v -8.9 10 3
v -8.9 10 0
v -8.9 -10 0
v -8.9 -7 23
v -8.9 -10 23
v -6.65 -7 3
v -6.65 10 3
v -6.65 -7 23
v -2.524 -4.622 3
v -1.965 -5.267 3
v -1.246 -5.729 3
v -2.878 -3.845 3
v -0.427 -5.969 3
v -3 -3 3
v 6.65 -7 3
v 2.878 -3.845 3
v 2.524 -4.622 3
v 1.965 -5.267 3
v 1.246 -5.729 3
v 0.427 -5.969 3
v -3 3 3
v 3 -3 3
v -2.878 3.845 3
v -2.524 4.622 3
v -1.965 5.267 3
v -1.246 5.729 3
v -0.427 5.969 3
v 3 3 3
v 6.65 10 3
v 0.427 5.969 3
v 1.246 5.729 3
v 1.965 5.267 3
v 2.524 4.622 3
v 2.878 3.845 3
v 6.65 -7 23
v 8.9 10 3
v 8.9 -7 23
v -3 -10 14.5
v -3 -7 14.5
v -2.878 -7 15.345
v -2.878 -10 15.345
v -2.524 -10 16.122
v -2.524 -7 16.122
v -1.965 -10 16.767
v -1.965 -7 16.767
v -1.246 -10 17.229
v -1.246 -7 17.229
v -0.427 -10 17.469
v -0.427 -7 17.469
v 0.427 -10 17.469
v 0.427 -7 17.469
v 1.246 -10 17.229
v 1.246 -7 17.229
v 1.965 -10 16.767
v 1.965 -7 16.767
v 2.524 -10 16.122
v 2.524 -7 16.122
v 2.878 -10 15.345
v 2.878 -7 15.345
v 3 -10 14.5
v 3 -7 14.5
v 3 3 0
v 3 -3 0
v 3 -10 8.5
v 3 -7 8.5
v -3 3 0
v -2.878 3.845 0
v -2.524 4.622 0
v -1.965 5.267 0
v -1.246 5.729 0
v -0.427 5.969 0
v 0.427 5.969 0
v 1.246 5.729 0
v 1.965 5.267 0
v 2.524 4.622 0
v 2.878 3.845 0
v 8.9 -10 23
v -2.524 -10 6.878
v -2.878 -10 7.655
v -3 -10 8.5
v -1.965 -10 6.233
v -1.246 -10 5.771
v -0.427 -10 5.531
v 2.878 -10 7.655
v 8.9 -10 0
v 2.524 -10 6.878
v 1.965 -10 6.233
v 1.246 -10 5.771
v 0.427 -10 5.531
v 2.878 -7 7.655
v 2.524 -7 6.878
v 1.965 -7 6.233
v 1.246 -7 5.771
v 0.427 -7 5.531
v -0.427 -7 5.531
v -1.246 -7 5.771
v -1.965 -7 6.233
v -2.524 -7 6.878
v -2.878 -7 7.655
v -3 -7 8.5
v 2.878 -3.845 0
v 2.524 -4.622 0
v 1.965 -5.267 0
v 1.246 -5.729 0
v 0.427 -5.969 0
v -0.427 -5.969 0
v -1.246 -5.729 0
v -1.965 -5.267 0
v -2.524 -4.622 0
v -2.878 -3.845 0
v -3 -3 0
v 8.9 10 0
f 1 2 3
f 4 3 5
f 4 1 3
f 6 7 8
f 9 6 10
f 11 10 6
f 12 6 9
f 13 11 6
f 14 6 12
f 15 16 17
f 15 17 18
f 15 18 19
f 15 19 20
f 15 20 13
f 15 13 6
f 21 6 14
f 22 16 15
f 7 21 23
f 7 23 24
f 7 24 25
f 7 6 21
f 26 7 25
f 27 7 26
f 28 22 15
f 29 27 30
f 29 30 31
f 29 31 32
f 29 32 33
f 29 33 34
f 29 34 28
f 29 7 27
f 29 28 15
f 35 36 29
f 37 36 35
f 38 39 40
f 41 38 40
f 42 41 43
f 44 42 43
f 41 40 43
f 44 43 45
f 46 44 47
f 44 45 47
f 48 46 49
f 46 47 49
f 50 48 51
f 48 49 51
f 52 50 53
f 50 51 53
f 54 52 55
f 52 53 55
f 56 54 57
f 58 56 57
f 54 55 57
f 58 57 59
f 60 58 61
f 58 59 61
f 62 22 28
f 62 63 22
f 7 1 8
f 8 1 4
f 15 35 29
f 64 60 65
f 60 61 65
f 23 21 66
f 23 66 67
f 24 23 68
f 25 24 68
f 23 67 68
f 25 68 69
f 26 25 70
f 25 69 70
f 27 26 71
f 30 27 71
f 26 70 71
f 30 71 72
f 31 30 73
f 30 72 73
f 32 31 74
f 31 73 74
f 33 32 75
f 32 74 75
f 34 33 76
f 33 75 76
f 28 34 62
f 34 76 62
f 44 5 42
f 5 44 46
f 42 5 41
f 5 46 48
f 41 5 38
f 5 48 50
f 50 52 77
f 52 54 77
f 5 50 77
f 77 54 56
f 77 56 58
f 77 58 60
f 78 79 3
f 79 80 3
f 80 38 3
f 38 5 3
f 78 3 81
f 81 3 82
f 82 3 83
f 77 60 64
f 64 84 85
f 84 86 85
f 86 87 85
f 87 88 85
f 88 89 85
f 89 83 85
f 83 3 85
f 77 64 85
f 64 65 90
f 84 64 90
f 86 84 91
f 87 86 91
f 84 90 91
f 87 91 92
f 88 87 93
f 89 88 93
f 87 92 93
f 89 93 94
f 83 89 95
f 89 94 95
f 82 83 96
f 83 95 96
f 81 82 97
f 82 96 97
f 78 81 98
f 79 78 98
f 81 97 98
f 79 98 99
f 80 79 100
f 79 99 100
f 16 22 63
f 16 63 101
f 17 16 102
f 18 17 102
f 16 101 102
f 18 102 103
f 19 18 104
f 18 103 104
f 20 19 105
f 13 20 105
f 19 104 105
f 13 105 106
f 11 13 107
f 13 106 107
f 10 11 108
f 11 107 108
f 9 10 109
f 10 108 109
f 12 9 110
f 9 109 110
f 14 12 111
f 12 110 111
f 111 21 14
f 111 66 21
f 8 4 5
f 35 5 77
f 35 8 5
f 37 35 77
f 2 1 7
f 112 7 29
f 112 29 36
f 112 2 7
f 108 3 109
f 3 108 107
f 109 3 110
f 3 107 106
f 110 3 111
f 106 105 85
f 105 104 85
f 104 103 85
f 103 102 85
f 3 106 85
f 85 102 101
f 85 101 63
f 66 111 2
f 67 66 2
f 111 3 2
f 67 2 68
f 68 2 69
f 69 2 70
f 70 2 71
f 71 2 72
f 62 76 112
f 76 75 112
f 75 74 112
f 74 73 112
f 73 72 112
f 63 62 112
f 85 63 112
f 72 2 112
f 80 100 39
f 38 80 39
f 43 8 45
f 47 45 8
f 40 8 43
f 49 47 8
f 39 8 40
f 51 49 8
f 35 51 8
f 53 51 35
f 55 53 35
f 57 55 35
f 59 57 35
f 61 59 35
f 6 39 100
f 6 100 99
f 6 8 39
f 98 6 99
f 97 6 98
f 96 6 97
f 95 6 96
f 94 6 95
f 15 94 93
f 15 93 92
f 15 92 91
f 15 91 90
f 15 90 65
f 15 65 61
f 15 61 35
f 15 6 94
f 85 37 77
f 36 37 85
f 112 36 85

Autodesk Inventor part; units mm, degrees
ref_plane "YZ Plane" through (0, 0, 0) normal (1, 0, 0) x (0, 1, 0)
ref_plane "XZ Plane" through (0, 0, 0) normal (0, 1, 0) x (-1, 0, 0)
ref_plane "XY Plane" through (0, 0, 0) normal (0, 0, 1) x (1, 0, 0)
sketch "Boceto1" plane through (0, 0, 0) normal (0, 0, 1) x (1, 0, 0)
  line L0 (8.9, -10) -> (-8.9, -10)
  line L1 (-8.9, -10) -> (-8.9, 10)
  line L2 (-8.9, 10) -> (8.9, 10)
  line L3 (8.9, 10) -> (8.9, -10)
  line L4 (8.9, -10) -> (-8.9, 10) construction
  line L5 (-8.9, -10) -> (8.9, 10) construction
  line L6 (0, 10) -> (0, -10)
  line L7 (8.9, 0) -> (-8.9, 0)
  line L8 (0, -3) -> (0, 3) construction
  line L9 (3, -3) -> (3, 3)
  line L10 (-3, 3) -> (-3, -3)
  arc A0 (-3, -3) -> (3, -3) centre (0, -3) ccw
  arc A1 (3, 3) -> (-3, 3) centre (0, 3) ccw
  point P0 (0, 0)
  dimension "d0" = 17.8
  dimension "d1" = 20
  dimension "d2" = 6
  dimension "d3" = 6
extrude "Extrusión1" add sketch "Boceto1" along normal blind 3 contours L0 L6 A0 L9 L7 L3 | L0 L1 L7 L10 A0 L6 | L7 L9 A1 L6 L2 L3 | L1 L2 L6 A1 L10 L7
sketch "Boceto2" plane through (0, 0, 3) normal (0, 0, 1) x (1, 0, 0)
  line L0 (-8.9, 10) -> (-8.9, -10) projected
  line L1 (-8.9, -10) -> (8.9, -10) projected
  line L2 (-8.9, -7) -> (8.9, -7)
  line L3 (8.9, -7) -> (8.9, -10)
  line L4 (8.9, -10) -> (-8.9, -10)
  line L5 (-8.9, -10) -> (-8.9, -7)
  point P0 (0, 0)
  dimension "d6" = 3
extrude "Extrusión2" add sketch "Boceto2" along normal blind 20
sketch "Boceto3" plane through (8.9, -10, 0) normal (1, 0, 0) x (0, 0, -1)
  line L0 (-3, 20) -> (-3, 3) projected
  line L1 (-3, 3) -> (-23, 3) projected
  line L2 (-3, 20) -> (-23, 3)
  line L3 (-23, 3) -> (-3, 3)
  line L4 (-3, 3) -> (-3, 20)
  point P0 (0, 10)
extrude "Extrusión3" add sketch "Boceto3" against normal blind 2.25
sketch "Boceto4" plane through (-8.9, -10, 0) normal (-1, 0, 0) x (0, 0, 1)
  line L0 (3, 20) -> (23, 3) projected
  line L1 (3, 20) -> (23, 3)
  line L2 (3, 3) -> (23, 3) projected
  line L3 (23, 3) -> (3, 3)
  line L4 (3, 3) -> (3, 20)
  point P0 (0, 10)
extrude "Extrusión4" add sketch "Boceto4" against normal blind 2.25
sketch "Boceto5" plane through (6.65, -7, 23) normal (0, 1, 0) x (1, 0, 0)
  line L0 (-6.65, 23) -> (-6.65, 0)
  line L1 (-15.55, 0) -> (2.25, 0) projected
  line L2 (2.25, 20) -> (2.25, 0) projected
  line L3 (-15.55, 23) -> (-15.55, 0) projected
  line L4 (2.25, 11.5) -> (-15.55, 11.5)
  line L5 (2.25, 23) -> (-15.55, 23) projected
  line L6 (-6.65, 14.5) -> (-6.65, 8.5) construction
  line L7 (-9.65, 14.5) -> (-9.65, 8.5)
  line L8 (-3.65, 8.5) -> (-3.65, 14.5)
  arc A0 (-3.65, 14.5) -> (-9.65, 14.5) centre (-6.65, 14.5) ccw
  arc A1 (-9.65, 8.5) -> (-3.65, 8.5) centre (-6.65, 8.5) ccw
  point P0 (-6.65, 11.5)
  dimension "d13" = 23
  dimension "d14" = 11.5
  dimension "d15" = 6
  dimension "d16" = 6
extrude "Extrusión5" cut sketch "Boceto5" against normal through all contours A0 L8 L4 L0 | L0 L4 L7 A0 | L4 L8 A1 L0 | L0 A1 L7 L4
properties part number "Cast corner bracket-20x20x17" material "Aluminio 6061, soldado"
